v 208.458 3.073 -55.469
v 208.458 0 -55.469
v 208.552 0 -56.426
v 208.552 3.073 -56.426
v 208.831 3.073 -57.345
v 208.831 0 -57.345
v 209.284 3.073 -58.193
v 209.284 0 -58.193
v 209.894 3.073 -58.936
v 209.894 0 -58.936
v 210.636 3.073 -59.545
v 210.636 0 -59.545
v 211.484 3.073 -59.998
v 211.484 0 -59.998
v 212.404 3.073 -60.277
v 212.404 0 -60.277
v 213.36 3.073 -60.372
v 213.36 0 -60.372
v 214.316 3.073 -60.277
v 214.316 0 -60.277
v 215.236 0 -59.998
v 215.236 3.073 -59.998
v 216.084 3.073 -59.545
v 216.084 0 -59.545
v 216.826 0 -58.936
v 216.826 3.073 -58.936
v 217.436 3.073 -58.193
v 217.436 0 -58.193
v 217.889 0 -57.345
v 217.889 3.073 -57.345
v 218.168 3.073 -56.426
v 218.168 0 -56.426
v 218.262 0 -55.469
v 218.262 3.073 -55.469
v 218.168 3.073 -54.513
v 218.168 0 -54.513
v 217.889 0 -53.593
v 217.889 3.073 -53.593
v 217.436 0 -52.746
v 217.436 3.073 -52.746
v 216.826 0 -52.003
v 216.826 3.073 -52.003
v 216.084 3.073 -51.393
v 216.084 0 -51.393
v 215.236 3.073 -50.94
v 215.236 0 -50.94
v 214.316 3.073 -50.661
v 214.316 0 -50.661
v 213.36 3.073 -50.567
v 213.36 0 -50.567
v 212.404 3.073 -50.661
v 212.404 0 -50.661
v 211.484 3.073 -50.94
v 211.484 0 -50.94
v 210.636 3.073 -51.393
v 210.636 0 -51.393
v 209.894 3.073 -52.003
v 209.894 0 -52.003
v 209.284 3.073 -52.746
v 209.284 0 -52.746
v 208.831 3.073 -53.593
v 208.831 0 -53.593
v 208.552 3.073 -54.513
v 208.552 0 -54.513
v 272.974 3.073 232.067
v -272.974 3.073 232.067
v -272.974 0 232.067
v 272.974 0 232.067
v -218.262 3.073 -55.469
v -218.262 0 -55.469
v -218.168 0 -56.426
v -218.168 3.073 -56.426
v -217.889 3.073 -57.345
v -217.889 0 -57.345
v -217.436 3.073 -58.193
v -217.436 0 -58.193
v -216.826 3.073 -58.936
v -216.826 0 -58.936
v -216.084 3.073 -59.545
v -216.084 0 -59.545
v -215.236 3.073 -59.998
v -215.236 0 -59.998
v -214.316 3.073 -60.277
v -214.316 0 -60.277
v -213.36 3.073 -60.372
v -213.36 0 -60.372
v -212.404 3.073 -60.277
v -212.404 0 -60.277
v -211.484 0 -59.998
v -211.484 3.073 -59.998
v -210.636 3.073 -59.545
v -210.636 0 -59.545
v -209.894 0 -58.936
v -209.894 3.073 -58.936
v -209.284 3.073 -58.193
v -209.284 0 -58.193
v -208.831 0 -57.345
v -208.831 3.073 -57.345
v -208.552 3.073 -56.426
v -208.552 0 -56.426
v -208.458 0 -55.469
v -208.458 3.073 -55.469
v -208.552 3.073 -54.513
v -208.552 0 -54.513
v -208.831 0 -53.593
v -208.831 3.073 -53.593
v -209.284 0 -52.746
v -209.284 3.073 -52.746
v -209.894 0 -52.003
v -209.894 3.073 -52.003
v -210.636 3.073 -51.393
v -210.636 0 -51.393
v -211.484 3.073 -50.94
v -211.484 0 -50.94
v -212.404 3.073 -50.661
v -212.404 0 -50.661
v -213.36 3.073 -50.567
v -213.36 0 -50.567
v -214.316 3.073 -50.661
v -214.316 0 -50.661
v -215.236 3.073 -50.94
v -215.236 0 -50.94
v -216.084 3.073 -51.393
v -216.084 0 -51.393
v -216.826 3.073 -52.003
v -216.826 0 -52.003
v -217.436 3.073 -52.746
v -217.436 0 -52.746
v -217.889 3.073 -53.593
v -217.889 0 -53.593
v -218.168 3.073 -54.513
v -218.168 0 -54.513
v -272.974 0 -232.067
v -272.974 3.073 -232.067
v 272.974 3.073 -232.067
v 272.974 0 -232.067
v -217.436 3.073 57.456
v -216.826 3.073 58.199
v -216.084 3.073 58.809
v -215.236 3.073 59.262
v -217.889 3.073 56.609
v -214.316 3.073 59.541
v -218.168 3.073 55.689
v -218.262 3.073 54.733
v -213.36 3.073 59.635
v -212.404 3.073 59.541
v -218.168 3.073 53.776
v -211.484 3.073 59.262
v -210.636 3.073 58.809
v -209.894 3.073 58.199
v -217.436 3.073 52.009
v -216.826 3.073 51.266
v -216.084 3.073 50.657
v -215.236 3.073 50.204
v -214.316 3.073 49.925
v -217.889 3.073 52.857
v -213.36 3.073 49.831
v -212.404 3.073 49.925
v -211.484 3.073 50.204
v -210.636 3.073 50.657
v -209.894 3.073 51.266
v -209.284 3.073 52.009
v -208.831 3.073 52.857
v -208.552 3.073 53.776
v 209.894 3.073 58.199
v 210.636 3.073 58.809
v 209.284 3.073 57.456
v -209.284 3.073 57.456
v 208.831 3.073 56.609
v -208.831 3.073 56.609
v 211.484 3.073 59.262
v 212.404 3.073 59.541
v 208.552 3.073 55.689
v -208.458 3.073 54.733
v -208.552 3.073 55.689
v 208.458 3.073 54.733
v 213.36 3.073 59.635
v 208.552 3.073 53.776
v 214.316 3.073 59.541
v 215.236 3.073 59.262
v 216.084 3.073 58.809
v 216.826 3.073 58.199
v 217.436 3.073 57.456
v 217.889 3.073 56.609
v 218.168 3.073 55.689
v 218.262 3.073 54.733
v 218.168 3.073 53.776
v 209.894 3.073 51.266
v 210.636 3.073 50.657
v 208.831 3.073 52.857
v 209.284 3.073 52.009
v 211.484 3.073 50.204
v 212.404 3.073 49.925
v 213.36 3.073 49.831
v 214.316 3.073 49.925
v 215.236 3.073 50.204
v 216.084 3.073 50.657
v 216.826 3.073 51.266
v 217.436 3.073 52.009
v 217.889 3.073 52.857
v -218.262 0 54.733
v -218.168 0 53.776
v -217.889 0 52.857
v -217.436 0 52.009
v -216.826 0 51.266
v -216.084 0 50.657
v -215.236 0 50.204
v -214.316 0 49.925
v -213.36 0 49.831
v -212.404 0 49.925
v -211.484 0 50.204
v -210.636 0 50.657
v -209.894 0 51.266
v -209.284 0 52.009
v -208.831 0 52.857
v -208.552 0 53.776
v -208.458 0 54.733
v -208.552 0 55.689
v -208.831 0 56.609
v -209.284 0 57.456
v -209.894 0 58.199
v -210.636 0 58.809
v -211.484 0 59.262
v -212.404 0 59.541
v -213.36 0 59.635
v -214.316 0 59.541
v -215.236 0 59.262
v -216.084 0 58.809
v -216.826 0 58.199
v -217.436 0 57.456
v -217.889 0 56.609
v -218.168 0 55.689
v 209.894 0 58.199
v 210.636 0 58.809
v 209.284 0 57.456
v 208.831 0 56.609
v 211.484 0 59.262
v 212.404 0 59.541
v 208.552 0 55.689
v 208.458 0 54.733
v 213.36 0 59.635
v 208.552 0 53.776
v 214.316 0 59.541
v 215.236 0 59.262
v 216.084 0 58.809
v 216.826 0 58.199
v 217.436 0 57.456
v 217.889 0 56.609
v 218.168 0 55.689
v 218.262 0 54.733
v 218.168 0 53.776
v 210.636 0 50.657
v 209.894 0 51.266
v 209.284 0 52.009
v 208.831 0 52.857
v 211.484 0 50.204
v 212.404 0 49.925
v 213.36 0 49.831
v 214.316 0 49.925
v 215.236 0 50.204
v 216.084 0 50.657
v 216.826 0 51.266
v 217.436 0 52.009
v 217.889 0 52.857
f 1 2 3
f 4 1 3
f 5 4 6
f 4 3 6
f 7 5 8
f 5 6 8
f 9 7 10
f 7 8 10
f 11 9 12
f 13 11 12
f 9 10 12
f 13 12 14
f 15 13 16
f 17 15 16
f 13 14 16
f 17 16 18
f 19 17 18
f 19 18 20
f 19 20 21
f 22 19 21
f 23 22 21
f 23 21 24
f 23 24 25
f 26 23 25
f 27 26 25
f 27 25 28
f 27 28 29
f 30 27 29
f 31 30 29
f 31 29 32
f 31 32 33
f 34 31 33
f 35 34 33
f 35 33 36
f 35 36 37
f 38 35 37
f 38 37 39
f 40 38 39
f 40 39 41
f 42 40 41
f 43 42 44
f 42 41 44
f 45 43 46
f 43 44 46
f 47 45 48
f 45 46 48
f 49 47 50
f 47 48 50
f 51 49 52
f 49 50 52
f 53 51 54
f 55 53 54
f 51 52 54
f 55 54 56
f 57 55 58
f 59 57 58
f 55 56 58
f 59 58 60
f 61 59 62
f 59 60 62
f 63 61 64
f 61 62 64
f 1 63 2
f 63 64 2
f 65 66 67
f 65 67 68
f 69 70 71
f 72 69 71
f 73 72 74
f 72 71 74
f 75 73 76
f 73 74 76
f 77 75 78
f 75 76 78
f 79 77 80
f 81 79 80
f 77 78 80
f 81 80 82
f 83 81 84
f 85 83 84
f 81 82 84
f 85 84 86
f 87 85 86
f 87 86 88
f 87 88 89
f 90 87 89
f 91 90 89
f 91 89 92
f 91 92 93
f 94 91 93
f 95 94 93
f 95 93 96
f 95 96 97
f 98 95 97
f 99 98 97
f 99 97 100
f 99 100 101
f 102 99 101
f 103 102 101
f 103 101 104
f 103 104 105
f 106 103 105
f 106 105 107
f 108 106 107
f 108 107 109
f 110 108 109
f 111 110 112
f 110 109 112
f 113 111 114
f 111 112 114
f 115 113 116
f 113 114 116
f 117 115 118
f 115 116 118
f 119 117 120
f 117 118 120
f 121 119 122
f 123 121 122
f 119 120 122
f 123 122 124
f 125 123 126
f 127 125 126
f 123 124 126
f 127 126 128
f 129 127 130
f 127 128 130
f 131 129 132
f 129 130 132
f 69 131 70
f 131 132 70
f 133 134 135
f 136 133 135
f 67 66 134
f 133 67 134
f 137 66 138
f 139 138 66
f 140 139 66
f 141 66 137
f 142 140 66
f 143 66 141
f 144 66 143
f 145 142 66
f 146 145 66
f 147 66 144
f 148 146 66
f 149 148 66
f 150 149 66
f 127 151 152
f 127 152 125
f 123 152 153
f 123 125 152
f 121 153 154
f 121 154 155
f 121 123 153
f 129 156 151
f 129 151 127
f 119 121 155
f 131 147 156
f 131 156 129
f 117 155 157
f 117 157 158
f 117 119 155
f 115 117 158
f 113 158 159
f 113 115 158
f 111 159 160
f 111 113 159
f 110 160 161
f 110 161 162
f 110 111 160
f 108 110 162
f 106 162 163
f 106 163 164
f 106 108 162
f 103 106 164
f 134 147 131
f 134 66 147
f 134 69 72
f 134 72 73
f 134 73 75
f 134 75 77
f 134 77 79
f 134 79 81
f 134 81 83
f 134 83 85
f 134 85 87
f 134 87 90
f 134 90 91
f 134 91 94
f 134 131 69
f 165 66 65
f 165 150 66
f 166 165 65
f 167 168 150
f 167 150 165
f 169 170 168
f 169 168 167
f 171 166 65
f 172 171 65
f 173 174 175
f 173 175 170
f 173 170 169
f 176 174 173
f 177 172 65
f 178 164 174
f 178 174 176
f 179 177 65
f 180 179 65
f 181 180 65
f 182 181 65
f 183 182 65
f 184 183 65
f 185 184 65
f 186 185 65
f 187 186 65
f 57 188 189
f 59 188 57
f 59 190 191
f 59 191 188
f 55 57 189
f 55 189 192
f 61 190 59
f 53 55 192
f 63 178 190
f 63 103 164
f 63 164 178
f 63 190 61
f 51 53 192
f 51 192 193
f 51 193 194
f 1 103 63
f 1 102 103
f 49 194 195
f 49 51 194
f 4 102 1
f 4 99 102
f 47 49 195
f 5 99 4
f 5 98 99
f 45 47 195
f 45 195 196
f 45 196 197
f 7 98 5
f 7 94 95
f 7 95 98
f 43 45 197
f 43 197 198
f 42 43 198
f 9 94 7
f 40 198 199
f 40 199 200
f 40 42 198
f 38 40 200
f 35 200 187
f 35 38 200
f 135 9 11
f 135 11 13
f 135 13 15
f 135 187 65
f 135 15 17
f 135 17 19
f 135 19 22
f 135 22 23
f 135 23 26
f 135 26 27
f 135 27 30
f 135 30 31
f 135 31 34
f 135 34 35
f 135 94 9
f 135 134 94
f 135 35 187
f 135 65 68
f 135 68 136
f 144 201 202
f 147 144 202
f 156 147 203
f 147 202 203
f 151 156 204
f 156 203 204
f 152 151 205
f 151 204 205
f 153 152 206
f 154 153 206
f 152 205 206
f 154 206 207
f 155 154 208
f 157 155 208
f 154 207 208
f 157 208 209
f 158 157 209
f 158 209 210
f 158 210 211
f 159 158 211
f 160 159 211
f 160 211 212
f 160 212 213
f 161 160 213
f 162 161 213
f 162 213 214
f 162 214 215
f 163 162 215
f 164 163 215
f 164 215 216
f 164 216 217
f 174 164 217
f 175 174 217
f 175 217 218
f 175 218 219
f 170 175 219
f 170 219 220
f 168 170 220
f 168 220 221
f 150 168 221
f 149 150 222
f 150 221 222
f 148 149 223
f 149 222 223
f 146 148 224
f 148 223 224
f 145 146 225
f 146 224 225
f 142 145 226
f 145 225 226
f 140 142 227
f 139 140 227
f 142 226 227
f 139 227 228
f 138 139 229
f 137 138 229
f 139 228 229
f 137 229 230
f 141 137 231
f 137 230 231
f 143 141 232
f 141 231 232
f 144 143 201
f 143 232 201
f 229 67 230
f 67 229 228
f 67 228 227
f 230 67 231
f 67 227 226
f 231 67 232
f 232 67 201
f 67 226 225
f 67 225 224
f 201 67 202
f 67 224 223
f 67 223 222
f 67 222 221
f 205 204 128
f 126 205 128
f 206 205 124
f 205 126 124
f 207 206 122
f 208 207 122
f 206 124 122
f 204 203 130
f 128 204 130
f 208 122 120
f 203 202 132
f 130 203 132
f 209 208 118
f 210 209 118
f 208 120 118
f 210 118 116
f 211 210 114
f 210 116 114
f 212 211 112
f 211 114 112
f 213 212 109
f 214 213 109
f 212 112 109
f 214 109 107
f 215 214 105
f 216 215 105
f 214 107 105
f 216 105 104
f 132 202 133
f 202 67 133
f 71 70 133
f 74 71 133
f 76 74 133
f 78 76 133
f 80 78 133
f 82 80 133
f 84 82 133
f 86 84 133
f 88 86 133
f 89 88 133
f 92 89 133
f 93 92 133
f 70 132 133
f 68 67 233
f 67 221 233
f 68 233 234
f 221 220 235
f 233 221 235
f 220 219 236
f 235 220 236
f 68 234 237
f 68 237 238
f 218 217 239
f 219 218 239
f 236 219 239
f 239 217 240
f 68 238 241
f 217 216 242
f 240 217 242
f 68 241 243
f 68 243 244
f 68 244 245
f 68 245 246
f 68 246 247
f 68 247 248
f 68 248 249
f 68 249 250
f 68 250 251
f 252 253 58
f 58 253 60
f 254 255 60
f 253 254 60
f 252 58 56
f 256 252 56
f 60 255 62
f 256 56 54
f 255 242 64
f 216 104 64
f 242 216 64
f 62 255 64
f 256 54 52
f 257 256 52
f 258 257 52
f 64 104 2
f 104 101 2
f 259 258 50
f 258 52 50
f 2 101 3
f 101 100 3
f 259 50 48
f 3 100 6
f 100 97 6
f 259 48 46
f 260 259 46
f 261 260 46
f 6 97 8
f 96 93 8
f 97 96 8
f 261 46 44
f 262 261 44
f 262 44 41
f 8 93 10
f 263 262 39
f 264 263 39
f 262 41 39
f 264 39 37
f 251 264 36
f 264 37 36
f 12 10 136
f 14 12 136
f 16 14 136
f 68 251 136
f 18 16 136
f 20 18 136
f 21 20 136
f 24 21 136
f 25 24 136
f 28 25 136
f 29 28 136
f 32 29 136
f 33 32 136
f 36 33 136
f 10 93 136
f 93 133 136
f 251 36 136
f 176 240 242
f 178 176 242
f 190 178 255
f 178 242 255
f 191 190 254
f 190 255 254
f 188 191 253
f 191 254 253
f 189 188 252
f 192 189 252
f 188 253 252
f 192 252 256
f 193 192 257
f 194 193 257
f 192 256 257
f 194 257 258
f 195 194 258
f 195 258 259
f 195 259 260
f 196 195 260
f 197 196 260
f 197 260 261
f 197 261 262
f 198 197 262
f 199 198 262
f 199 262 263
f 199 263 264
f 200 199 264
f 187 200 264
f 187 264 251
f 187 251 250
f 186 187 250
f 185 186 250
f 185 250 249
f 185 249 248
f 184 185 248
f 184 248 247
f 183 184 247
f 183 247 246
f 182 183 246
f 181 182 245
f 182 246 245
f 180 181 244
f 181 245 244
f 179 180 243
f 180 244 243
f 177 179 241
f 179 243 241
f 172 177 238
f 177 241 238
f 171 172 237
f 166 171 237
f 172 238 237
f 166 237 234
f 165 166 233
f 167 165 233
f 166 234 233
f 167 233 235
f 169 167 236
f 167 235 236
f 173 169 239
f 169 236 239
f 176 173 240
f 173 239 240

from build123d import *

# Parameters (mm, degrees)
SKETCH1_W                = 584.2
SKETCH1_H                = 502.3866
TOPPLATE_DEPTH           = 3.0734
SKETCH2_R                = 2.8956
FRONT_REARTOPHOLES_DEPTH = 4.0734
LPATTERN1_COUNT          = 4
LPATTERN1_PITCH          = 142.24
SKETCH3_R                = 2.8956
CUT_EXTRUDE2_DEPTH       = 4.0734
LPATTERN2_COUNT          = 4
LPATTERN2_PITCH          = 110.202133333
F_3_8_CLEARANCE_HOLE1_D  = 9.8044
SKETCH7_W                = 584.2
SKETCH7_H                = 502.3866
SKETCH7_W_2              = 545.9476
SKETCH7_H_2              = 464.1342
CUT_EXTRUDE3_DEPTH       = 4.0734


with BuildPart() as part:
    # Sketch1 → TopPlate (new body)
    with BuildSketch(Plane(origin=(0, 0, 0), x_dir=(1, 0, 0), z_dir=(0, 1, 0))):
        Rectangle(SKETCH1_W, SKETCH1_H)
    extrude(amount=TOPPLATE_DEPTH)

    # Sketch2 → Front/RearTopHoles (cut, through all)
    with BuildSketch(Plane(origin=(0, 3.0734, 0), x_dir=(1, 0, 0), z_dir=(0, 1, 0))):
        with Locations((-213.36, 238.5949)):
            Circle(SKETCH2_R)
        with Locations((-213.36, -237.8583)):
            Circle(SKETCH2_R)
    front_reartopholes = extrude(amount=-FRONT_REARTOPHOLES_DEPTH, mode=Mode.SUBTRACT)

    # LPattern1: Front/RearTopHoles ×4
    with Locations(*[(i * LPATTERN1_PITCH, 0, 0) for i in range(1, LPATTERN1_COUNT)]):
        add(front_reartopholes, mode=Mode.SUBTRACT)

    # Sketch3 → Cut-Extrude2 (cut, through all)
    with BuildSketch(Plane(origin=(0, 3.0734, 0), x_dir=(1, 0, 0), z_dir=(0, 1, 0))):
        with Locations((-279.5016, 165.6715)):
            Circle(SKETCH3_R)
        with Locations((279.5016, 165.6715)):
            Circle(SKETCH3_R)
    cut_extrude2 = extrude(amount=-CUT_EXTRUDE2_DEPTH, mode=Mode.SUBTRACT)

    # LPattern2: Cut-Extrude2 ×4
    with Locations(*[(0, 0, i * LPATTERN2_PITCH) for i in range(1, LPATTERN2_COUNT)]):
        add(cut_extrude2, mode=Mode.SUBTRACT)

    # 3/8 Clearance Hole1 (through all)
    with Locations(Plane(origin=(0, 3.0734, 0), x_dir=(1, 0, 0), z_dir=(0, 1, 0))):
        with Locations((-213.36, 55.469366667), (-213.36, -54.732766667), (213.36, -54.732766667), (213.36, 55.469366667)):
            Hole(F_3_8_CLEARANCE_HOLE1_D / 2)

    # Sketch7 → Cut-Extrude3 (cut, through all)
    with BuildSketch(Plane(origin=(0, 3.0734, 0), x_dir=(1, 0, 0), z_dir=(0, 1, 0))):
        Rectangle(SKETCH7_W, SKETCH7_H)
        Rectangle(SKETCH7_W_2, SKETCH7_H_2, mode=Mode.SUBTRACT)
    extrude(amount=-CUT_EXTRUDE3_DEPTH, mode=Mode.SUBTRACT)


solid = part.part
